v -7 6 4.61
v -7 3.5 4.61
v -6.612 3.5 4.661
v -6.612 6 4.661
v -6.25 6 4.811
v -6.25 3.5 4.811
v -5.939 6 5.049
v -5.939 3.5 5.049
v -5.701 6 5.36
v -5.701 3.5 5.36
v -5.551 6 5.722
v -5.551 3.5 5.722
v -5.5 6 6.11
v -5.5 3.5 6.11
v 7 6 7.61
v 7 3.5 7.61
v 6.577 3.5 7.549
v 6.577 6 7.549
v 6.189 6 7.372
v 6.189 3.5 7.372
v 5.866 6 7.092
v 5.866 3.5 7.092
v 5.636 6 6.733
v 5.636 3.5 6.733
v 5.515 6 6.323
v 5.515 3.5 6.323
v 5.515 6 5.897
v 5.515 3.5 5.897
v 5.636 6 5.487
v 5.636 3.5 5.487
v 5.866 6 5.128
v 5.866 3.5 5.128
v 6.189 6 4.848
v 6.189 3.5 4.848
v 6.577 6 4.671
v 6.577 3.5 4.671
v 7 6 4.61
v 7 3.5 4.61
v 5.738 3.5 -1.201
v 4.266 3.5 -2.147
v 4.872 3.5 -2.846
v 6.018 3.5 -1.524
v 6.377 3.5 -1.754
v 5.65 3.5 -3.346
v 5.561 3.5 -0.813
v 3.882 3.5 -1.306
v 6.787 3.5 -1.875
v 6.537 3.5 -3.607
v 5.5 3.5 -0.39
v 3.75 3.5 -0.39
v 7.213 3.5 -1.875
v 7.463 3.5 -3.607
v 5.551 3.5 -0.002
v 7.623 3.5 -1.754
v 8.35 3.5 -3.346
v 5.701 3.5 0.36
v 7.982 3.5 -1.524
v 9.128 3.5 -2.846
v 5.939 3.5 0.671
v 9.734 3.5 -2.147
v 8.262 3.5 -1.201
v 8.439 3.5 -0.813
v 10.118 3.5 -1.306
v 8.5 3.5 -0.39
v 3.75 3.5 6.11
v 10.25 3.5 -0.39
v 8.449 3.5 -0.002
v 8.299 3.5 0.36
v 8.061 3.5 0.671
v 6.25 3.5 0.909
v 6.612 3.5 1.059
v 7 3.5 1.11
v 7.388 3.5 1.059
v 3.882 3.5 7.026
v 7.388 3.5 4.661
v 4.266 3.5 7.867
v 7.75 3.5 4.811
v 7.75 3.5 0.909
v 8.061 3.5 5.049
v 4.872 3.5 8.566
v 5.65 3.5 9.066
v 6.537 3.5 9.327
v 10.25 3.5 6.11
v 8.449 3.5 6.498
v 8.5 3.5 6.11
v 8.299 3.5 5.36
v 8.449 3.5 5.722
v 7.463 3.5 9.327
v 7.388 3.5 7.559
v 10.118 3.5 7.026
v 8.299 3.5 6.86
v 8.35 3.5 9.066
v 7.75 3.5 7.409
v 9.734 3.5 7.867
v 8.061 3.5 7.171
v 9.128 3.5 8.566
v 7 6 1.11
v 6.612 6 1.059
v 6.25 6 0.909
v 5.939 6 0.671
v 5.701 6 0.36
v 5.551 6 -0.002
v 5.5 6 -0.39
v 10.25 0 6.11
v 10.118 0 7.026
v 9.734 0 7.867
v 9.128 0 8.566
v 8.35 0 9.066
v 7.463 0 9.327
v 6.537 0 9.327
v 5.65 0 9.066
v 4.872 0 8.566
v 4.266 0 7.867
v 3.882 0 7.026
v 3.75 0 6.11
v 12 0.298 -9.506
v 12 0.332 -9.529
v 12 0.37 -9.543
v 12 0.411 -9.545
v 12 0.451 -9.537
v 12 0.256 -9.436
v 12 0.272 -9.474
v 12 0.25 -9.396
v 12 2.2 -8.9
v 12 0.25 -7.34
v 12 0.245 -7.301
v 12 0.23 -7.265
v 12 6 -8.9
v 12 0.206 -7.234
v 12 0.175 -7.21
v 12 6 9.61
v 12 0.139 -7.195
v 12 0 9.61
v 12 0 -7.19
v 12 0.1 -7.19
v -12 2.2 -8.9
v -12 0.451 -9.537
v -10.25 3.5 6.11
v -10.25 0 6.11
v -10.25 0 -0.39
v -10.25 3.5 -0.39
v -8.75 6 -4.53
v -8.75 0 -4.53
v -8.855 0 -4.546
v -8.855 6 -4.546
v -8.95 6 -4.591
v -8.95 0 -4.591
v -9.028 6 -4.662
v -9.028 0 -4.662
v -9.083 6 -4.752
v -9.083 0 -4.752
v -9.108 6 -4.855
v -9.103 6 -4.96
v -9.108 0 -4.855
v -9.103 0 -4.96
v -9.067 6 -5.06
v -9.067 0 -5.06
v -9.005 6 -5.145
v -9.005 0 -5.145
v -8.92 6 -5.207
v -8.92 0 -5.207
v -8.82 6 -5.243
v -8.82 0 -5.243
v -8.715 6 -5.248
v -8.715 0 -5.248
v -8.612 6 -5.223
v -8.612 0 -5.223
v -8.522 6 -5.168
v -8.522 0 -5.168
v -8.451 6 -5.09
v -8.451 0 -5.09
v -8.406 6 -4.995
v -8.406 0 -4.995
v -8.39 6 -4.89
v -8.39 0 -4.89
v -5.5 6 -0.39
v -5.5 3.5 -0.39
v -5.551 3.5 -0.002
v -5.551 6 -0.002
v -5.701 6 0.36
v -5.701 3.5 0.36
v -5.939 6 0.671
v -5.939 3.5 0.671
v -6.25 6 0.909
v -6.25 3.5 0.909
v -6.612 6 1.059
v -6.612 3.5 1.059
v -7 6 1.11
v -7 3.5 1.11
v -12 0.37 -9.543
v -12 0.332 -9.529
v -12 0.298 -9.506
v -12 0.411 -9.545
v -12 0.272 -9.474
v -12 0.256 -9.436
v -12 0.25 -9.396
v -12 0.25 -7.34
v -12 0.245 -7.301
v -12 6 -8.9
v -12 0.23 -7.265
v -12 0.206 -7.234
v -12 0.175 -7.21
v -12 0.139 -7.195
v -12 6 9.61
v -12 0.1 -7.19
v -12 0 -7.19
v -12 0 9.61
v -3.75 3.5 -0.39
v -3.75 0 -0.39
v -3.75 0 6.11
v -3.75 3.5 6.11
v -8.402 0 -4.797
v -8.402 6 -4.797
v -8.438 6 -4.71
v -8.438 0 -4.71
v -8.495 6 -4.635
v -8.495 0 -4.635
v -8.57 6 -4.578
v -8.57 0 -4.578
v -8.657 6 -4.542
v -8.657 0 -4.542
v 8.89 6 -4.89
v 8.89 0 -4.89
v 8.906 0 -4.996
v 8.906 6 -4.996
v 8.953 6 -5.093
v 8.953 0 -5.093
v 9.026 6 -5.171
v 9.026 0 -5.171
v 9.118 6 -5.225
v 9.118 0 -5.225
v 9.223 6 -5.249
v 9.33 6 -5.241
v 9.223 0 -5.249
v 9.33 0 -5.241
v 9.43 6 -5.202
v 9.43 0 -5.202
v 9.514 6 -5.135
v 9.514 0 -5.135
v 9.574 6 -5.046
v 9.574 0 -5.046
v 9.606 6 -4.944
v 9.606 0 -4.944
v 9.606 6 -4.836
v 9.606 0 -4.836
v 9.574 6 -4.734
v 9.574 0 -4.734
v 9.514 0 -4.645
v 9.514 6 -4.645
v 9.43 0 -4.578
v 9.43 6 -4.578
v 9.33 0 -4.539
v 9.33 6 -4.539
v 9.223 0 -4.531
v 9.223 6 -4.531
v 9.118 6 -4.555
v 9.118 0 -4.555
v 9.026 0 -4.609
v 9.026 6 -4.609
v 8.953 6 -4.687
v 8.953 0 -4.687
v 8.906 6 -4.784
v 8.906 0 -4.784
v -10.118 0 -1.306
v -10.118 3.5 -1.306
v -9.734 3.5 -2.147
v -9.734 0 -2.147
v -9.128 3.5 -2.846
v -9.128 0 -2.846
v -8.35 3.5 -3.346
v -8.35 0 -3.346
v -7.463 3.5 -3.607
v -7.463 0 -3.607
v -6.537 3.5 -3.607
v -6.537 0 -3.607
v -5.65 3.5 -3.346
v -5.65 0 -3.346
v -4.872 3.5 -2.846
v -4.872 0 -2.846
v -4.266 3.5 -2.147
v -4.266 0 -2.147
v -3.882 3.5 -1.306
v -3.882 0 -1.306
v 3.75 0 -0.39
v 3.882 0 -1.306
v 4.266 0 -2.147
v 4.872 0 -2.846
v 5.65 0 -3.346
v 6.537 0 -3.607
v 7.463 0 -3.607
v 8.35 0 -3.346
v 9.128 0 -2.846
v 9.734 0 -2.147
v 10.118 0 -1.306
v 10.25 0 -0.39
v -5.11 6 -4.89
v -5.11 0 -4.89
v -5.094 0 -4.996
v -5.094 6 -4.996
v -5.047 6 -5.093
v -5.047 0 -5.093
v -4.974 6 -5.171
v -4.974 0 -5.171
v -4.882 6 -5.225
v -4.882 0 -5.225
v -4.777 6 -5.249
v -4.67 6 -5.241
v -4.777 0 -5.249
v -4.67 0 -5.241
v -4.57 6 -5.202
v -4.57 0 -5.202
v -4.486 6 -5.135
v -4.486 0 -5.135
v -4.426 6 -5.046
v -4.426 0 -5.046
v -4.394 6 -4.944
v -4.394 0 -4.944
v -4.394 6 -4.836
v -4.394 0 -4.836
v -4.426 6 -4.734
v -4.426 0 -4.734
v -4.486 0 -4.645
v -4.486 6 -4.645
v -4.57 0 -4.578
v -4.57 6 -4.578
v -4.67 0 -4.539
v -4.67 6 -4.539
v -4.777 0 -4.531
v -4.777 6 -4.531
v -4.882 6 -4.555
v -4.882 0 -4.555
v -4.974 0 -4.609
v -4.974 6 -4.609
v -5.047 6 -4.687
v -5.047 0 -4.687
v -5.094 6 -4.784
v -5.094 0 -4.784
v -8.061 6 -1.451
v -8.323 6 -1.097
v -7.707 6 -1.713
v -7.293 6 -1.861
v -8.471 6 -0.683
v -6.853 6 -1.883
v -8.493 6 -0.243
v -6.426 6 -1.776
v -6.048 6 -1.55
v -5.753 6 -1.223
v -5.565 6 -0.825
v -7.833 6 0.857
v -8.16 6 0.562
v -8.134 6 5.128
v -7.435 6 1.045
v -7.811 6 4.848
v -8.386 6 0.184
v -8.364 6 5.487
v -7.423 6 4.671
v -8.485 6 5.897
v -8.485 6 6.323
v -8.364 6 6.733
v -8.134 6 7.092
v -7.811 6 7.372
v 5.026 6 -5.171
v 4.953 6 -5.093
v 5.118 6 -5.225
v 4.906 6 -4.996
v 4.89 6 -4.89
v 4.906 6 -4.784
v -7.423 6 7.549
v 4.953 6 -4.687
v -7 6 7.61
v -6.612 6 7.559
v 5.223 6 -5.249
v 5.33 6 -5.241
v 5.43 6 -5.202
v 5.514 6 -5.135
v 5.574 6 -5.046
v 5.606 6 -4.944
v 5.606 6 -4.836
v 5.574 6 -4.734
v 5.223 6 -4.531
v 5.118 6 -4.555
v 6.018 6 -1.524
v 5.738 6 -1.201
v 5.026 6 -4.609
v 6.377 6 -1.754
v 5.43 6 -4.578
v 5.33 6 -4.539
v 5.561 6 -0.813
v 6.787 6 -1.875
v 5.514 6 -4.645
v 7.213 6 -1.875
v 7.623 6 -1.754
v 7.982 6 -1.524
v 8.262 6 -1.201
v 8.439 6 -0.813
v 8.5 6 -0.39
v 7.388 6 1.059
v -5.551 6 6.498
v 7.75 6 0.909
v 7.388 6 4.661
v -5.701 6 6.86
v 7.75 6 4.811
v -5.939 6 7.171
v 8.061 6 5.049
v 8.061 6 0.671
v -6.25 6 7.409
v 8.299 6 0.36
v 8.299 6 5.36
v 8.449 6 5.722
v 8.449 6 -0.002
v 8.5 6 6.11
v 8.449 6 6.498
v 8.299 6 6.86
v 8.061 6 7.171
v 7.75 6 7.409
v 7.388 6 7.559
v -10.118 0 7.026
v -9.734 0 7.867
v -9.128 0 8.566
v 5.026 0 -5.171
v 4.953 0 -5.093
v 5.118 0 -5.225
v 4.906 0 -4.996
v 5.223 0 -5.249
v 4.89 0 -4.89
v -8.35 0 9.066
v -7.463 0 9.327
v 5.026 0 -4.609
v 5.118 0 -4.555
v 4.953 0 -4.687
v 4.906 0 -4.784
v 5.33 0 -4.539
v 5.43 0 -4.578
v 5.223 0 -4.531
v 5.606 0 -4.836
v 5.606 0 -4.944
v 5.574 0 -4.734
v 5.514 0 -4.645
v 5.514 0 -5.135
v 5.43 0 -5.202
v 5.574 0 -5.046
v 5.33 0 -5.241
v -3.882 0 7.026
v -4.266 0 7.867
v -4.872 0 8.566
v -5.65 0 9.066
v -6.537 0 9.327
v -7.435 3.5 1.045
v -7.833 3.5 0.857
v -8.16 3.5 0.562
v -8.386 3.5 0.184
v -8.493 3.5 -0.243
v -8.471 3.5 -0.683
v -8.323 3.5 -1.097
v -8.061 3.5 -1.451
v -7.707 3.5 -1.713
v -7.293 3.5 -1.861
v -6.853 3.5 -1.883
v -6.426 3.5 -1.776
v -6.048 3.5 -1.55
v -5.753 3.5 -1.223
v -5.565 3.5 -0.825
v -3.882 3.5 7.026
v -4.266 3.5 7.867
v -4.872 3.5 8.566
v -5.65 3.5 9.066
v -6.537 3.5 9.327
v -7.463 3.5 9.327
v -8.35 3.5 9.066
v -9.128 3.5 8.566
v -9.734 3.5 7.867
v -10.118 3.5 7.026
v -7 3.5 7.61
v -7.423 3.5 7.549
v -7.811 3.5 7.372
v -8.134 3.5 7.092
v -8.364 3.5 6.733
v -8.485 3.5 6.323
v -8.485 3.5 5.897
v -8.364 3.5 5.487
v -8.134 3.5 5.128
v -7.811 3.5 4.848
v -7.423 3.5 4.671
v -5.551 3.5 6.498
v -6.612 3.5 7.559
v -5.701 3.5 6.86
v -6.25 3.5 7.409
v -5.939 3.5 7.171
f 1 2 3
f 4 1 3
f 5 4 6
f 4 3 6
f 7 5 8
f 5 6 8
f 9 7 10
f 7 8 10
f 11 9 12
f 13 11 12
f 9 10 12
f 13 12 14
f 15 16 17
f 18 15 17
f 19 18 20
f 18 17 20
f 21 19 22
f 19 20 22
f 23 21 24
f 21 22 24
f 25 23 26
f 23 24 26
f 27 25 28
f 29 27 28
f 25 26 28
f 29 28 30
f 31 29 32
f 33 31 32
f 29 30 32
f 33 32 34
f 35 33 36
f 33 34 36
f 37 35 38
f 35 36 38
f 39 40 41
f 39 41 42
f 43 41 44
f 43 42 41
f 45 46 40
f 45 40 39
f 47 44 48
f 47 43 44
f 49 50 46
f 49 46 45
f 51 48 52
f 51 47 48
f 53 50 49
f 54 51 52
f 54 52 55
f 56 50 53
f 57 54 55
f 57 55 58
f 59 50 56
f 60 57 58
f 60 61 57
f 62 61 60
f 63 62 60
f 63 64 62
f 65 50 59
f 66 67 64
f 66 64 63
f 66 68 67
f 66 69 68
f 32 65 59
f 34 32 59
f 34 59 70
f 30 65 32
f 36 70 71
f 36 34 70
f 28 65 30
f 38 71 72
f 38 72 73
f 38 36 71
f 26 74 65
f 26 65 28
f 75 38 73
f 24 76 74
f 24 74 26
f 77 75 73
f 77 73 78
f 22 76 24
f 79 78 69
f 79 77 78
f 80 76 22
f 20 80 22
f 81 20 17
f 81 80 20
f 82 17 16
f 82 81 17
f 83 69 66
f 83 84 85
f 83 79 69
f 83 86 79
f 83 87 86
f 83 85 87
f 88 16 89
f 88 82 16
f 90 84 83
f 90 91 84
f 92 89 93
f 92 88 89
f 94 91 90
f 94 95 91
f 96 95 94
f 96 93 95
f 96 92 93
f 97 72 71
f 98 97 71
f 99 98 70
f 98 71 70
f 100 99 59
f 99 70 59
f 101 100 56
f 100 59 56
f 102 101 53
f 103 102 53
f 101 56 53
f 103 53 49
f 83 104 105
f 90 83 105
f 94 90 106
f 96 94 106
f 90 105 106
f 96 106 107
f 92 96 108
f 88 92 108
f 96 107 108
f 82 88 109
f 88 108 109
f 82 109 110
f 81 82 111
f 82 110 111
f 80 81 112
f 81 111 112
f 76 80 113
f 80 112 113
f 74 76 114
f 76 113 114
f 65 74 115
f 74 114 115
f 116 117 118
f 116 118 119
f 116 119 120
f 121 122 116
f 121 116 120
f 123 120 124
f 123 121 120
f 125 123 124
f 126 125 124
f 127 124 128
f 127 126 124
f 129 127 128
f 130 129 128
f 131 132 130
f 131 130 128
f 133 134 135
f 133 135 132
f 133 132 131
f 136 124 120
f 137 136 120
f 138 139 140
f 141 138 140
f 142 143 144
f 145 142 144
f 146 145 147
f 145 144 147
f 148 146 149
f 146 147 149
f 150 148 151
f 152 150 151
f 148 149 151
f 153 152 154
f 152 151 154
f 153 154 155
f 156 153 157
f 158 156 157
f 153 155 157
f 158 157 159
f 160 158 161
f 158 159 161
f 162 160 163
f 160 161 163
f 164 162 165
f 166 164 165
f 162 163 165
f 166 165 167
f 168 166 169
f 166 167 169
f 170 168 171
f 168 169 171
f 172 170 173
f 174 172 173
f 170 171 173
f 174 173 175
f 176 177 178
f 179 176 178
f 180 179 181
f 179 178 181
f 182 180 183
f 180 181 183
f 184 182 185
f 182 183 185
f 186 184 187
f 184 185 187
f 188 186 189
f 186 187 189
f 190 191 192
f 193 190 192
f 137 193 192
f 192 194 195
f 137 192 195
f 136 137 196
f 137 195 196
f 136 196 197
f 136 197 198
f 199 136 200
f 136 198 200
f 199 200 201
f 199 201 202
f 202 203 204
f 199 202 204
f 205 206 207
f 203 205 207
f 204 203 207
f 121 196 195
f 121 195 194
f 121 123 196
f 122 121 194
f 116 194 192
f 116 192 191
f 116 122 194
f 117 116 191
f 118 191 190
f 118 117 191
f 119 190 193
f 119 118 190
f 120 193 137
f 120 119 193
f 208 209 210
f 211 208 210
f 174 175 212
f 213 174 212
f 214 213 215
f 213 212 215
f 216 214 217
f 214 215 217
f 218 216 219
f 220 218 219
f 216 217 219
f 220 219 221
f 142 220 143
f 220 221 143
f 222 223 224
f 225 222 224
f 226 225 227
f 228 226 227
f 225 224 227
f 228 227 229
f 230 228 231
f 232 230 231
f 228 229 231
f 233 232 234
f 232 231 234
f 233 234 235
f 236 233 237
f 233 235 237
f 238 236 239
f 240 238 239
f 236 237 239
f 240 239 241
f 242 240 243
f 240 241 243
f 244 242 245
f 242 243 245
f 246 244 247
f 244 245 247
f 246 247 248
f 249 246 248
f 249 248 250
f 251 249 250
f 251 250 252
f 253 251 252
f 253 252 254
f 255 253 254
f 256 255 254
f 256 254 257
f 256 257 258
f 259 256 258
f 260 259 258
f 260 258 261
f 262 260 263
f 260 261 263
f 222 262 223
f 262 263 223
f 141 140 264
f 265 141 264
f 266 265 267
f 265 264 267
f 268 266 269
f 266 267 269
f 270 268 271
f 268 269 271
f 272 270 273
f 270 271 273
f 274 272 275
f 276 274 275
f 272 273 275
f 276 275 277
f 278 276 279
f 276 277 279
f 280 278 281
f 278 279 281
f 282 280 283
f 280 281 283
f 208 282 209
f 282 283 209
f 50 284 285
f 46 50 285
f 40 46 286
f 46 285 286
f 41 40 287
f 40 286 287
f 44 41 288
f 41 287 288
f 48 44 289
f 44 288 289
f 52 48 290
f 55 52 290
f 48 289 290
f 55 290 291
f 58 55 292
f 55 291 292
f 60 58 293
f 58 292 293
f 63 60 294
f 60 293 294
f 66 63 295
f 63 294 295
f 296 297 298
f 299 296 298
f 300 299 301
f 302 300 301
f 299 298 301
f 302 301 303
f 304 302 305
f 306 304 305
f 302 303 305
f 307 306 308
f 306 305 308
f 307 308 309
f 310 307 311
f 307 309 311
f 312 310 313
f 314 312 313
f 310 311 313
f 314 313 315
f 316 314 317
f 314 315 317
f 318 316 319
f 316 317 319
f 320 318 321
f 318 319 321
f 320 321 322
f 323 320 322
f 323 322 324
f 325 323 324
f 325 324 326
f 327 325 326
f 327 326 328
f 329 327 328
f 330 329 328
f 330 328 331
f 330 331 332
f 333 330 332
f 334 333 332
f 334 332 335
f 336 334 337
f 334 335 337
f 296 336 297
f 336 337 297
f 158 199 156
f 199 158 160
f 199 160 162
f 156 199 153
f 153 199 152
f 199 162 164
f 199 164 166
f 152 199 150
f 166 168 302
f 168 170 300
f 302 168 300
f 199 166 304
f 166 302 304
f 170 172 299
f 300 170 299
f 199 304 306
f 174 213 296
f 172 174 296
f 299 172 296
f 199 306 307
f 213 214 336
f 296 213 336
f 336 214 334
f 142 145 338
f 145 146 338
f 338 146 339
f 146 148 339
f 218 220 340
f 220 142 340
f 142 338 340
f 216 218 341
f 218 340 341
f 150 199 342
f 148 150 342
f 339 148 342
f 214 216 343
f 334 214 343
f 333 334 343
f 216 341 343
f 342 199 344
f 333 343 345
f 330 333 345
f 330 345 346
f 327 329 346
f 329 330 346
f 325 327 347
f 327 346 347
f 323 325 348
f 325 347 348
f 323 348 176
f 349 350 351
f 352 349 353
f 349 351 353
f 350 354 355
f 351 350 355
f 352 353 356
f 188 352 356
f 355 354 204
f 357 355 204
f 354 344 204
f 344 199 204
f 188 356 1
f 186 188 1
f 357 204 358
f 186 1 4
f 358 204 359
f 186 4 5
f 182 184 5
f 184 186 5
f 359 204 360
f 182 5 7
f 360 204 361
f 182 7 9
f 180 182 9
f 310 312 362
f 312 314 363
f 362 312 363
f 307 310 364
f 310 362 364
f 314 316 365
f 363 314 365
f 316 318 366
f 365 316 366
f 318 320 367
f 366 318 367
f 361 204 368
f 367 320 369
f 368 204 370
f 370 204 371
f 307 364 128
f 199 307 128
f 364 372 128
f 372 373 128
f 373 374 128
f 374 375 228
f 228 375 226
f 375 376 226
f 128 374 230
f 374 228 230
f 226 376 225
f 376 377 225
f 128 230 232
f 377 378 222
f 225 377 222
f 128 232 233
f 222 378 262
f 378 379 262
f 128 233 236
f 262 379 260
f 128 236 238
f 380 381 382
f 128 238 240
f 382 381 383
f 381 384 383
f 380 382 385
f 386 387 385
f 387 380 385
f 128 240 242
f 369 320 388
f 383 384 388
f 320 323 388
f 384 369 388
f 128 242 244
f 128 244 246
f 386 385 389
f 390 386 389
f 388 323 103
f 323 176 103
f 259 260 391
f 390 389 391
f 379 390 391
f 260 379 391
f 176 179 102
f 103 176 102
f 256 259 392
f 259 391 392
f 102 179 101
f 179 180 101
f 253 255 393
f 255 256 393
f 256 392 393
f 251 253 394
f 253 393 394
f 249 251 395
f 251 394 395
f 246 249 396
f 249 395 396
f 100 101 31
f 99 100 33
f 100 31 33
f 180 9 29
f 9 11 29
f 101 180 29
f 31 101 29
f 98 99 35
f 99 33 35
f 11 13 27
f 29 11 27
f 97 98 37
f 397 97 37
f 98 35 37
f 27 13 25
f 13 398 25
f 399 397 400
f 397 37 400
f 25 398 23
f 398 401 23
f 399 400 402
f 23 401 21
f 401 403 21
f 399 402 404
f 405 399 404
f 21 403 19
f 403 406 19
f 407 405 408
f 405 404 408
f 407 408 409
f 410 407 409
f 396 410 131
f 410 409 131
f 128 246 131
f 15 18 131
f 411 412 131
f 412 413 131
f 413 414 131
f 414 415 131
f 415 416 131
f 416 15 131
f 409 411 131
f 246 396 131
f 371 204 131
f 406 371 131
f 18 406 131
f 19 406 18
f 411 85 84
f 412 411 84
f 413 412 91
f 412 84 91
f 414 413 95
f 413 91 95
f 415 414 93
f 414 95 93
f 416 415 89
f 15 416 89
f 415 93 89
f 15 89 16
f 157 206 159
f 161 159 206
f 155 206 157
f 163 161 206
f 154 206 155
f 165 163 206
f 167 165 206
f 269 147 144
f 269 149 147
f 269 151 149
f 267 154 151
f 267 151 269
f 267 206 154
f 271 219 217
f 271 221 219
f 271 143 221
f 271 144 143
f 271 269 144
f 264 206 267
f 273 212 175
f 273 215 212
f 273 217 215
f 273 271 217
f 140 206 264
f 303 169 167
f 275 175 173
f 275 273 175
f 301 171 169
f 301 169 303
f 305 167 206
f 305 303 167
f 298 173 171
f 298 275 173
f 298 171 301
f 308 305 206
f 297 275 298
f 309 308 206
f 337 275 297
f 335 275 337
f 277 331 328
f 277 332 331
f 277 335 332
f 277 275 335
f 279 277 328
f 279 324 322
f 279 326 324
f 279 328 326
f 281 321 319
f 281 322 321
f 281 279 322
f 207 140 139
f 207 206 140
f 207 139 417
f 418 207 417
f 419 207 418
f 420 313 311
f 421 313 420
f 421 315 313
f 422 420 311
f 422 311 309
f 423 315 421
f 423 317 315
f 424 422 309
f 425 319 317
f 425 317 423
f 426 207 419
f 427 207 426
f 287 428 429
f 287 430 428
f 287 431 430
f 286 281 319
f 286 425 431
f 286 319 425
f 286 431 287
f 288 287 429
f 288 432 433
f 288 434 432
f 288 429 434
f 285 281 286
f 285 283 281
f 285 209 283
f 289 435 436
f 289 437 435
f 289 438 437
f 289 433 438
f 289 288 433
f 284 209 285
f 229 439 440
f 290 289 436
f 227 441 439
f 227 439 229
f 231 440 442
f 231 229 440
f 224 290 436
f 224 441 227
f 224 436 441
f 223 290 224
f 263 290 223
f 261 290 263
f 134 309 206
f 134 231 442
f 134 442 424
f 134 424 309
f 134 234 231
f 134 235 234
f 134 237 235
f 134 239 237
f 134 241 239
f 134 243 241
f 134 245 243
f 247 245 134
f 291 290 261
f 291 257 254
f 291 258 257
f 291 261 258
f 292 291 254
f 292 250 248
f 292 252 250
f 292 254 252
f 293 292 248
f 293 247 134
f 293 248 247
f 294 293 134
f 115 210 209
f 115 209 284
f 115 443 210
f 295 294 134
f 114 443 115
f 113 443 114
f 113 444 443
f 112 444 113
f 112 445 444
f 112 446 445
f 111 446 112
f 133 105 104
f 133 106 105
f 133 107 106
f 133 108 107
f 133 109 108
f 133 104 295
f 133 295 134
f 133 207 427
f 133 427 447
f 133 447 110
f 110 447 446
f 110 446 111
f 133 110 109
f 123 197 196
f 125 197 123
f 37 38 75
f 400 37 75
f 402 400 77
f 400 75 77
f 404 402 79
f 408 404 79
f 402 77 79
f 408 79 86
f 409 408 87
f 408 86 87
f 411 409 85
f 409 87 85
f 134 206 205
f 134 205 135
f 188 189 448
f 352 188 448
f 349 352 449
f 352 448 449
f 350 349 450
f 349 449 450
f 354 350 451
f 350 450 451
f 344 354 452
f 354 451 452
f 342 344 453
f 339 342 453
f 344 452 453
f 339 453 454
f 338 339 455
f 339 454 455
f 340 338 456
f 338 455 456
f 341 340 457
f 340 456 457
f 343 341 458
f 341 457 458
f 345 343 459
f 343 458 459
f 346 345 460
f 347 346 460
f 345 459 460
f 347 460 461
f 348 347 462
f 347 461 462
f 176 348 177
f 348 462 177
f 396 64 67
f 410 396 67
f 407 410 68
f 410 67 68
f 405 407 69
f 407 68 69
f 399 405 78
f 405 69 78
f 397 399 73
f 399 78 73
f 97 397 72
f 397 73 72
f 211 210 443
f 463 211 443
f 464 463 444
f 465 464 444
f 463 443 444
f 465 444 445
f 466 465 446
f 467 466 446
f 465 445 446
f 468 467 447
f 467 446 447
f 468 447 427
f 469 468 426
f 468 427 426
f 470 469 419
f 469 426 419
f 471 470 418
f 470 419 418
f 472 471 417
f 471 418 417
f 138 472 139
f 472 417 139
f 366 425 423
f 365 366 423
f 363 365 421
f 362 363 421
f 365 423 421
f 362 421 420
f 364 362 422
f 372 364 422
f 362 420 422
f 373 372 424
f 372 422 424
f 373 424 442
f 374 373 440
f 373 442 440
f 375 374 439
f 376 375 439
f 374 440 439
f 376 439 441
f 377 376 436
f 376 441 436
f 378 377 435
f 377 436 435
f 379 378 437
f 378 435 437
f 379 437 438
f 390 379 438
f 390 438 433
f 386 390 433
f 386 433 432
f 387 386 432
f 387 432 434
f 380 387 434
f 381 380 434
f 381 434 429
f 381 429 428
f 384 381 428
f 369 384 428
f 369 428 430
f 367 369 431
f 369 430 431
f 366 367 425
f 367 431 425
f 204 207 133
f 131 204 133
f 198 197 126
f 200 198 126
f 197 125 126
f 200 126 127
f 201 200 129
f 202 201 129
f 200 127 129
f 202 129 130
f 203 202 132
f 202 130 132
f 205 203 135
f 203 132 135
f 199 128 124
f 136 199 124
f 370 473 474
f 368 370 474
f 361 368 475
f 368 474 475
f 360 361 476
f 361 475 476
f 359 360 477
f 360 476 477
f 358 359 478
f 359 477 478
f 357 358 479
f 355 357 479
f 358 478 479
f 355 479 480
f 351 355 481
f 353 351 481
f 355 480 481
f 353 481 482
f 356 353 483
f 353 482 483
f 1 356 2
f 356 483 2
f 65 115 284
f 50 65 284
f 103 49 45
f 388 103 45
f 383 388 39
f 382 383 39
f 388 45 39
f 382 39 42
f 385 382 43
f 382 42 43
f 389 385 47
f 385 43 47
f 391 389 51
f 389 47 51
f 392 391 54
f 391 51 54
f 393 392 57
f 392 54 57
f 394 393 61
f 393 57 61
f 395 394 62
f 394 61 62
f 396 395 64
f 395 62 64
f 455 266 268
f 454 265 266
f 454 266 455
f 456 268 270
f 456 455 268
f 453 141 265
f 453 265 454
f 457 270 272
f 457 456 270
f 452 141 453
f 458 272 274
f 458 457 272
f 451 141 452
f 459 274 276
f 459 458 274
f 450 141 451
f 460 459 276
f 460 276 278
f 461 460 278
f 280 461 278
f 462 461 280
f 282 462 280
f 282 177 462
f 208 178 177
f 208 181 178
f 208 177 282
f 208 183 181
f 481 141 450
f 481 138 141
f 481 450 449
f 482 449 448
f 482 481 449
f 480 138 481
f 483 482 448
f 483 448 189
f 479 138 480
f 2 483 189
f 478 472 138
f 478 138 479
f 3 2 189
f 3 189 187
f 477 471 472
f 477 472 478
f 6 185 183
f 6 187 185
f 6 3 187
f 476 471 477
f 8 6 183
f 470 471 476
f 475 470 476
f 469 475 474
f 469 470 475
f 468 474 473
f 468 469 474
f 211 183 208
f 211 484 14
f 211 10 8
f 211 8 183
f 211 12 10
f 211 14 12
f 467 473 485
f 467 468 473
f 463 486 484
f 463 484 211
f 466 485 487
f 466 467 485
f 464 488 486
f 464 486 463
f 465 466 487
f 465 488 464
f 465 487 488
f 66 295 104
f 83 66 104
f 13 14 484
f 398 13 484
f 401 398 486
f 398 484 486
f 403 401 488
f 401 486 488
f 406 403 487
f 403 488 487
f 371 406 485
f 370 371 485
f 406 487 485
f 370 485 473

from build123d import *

# Parameters (mm, degrees)
F0_W      = 24
F0_H      = 19.22
F1_DEPTH  = 6
F3_DEPTH  = 6
F5_DEPTH  = 3.5
F6_W      = 24
F6_H      = 2.42
F7_DEPTH  = 0.25
F9_DEPTH  = 6
F11_DEPTH = 24
F12_R     = 0.15
F13_R     = 0.15


with BuildPart() as f1:
    # F0 (on Front) → F1 (new body)
    with BuildSketch(Plane.XZ):
        Rectangle(F0_W, F0_H)
    extrude(amount=-F1_DEPTH)

    # F2 (on face) → F3 (cut, through all)
    with BuildSketch(Plane.XZ):
        with BuildLine():
            ThreePointArc((-5.5, 6.11), (-5.93934, 7.17066), (-7, 7.61))
            Line((-7, 7.61), (-7, 6.11))
            Line((-7, 6.11), (-7, 4.61))
            ThreePointArc((-7, 4.61), (-5.93934, 5.04934), (-5.5, 6.11))
        make_face()
        with BuildLine():
            ThreePointArc((7, 7.61), (5.5, 6.11), (7, 4.61))
            Line((7, 4.61), (7, 6.11))
            Line((7, 6.11), (7, 7.61))
        make_face()
        with BuildLine():
            Line((7, 6.11), (7, 4.61))
            ThreePointArc((7, 4.61), (8.06066, 5.04934), (8.5, 6.11))
            ThreePointArc((8.5, 6.11), (8.06066, 7.17066), (7, 7.61))
            Line((7, 7.61), (7, 6.11))
        make_face()
        with BuildLine():
            ThreePointArc((7, 1.11), (5.93934, 0.67066), (5.5, -0.39))
            Line((5.5, -0.39), (7, -0.39))
            Line((7, -0.39), (7, 1.11))
        make_face()
        with BuildLine():
            Line((7, -0.39), (5.5, -0.39))
            ThreePointArc((5.5, -0.39), (7, -1.89), (8.5, -0.39))
            ThreePointArc((8.5, -0.39), (8.06066, 0.67066), (7, 1.11))
            Line((7, 1.11), (7, -0.39))
        make_face()
        with BuildLine():
            ThreePointArc((-5.5, -0.39), (-5.93934, 0.67066), (-7, 1.11))
            Line((-7, 1.11), (-7, -0.39))
            Line((-7, -0.39), (-5.5, -0.39))
        make_face()
        with BuildLine():
            Line((-7, -0.39), (-7, 1.11))
            ThreePointArc((-7, 1.11), (-8.06066, -1.45066), (-5.5, -0.39))
            Line((-5.5, -0.39), (-7, -0.39))
        make_face()
        with BuildLine():
            Line((-7, 6.11), (-7, 7.61))
            ThreePointArc((-7, 7.61), (-8.5, 6.11), (-7, 4.61))
            Line((-7, 4.61), (-7, 6.11))
        make_face()
    extrude(amount=-F3_DEPTH, mode=Mode.SUBTRACT)

    # F4 (on face) → F5 (cut)
    with BuildSketch(Plane.XZ):
        with BuildLine():
            ThreePointArc((-3.75, 6.11), (-7, 9.36), (-10.25, 6.11))
            Line((-10.25, 6.11), (-10.25, -0.39))
            ThreePointArc((-10.25, -0.39), (-7, -3.64), (-3.75, -0.39))
            Line((-3.75, -0.39), (-3.75, 6.11))
        make_face()
        with BuildLine():
            ThreePointArc((3.75, -0.39), (7, -3.64), (10.25, -0.39))
            Line((10.25, -0.39), (10.25, 6.11))
            ThreePointArc((10.25, 6.11), (7, 9.36), (3.75, 6.11))
            Line((3.75, 6.11), (3.75, -0.39))
        make_face()
    extrude(amount=-F5_DEPTH, mode=Mode.SUBTRACT)

    # F6 (on face) → F7 (cut)
    with BuildSketch(Plane.XZ):
        with Locations((0, -8.4)):
            Rectangle(F6_W, F6_H)
    extrude(amount=-F7_DEPTH, mode=Mode.SUBTRACT)

    # F8 (on face) → F9 (cut, through all)
    with BuildSketch(Plane.XZ):
        with BuildLine():
            ThreePointArc((-8.39, -4.89), (-8.495442, -4.635442), (-8.75, -4.53))
            Line((-8.75, -4.53), (-8.75, -4.89))
            Line((-8.75, -4.89), (-8.39, -4.89))
        make_face()
        with BuildLine():
            ThreePointArc((9.61, -4.89), (9.25, -4.53), (8.89, -4.89))
            ThreePointArc((8.89, -4.89), (9.25, -5.25), (9.61, -4.89))
        make_face()
        with BuildLine():
            ThreePointArc((5.61, -4.89), (5.25, -4.53), (4.89, -4.89))
            Line((4.89, -4.89), (5.25, -4.89))
            Line((5.25, -4.89), (5.61, -4.89))
        make_face()
        with BuildLine():
            Line((5.25, -4.89), (4.89, -4.89))
            ThreePointArc((4.89, -4.89), (5.25, -5.25), (5.61, -4.89))
            Line((5.61, -4.89), (5.25, -4.89))
        make_face()
        with BuildLine():
            ThreePointArc((-4.39, -4.89), (-4.75, -4.53), (-5.11, -4.89))
            Line((-5.11, -4.89), (-4.75, -4.89))
            Line((-4.75, -4.89), (-4.39, -4.89))
        make_face()
        with BuildLine():
            Line((-4.75, -4.89), (-5.11, -4.89))
            ThreePointArc((-5.11, -4.89), (-4.75, -5.25), (-4.39, -4.89))
            Line((-4.39, -4.89), (-4.75, -4.89))
        make_face()
        with BuildLine():
            Line((-8.75, -4.89), (-8.75, -4.53))
            ThreePointArc((-8.75, -4.53), (-9.004558, -5.144558), (-8.39, -4.89))
            Line((-8.39, -4.89), (-8.75, -4.89))
        make_face()
    extrude(amount=-F9_DEPTH, mode=Mode.SUBTRACT)

    # F10 (on face) → F11 (cut, through all)
    with BuildSketch(Plane.YZ.offset(12)):
        Polygon((2.2, -8.900258), (0.25, -9.61), (6, -9.61), (6, -8.900258), align=None)
    extrude(amount=-F11_DEPTH, mode=Mode.SUBTRACT)

    # F12
    f12_edges = [f1.edges().sort_by_distance(p)[0] for p in [
        (0, 0.25, -9.61),
    ]]
    fillet(f12_edges, radius=F12_R)

    # F13
    f13_edges = [f1.edges().sort_by_distance(p)[0] for p in [
        (0, 0.25, -7.19),
    ]]
    fillet(f13_edges, radius=F13_R)


solid = f1.part
